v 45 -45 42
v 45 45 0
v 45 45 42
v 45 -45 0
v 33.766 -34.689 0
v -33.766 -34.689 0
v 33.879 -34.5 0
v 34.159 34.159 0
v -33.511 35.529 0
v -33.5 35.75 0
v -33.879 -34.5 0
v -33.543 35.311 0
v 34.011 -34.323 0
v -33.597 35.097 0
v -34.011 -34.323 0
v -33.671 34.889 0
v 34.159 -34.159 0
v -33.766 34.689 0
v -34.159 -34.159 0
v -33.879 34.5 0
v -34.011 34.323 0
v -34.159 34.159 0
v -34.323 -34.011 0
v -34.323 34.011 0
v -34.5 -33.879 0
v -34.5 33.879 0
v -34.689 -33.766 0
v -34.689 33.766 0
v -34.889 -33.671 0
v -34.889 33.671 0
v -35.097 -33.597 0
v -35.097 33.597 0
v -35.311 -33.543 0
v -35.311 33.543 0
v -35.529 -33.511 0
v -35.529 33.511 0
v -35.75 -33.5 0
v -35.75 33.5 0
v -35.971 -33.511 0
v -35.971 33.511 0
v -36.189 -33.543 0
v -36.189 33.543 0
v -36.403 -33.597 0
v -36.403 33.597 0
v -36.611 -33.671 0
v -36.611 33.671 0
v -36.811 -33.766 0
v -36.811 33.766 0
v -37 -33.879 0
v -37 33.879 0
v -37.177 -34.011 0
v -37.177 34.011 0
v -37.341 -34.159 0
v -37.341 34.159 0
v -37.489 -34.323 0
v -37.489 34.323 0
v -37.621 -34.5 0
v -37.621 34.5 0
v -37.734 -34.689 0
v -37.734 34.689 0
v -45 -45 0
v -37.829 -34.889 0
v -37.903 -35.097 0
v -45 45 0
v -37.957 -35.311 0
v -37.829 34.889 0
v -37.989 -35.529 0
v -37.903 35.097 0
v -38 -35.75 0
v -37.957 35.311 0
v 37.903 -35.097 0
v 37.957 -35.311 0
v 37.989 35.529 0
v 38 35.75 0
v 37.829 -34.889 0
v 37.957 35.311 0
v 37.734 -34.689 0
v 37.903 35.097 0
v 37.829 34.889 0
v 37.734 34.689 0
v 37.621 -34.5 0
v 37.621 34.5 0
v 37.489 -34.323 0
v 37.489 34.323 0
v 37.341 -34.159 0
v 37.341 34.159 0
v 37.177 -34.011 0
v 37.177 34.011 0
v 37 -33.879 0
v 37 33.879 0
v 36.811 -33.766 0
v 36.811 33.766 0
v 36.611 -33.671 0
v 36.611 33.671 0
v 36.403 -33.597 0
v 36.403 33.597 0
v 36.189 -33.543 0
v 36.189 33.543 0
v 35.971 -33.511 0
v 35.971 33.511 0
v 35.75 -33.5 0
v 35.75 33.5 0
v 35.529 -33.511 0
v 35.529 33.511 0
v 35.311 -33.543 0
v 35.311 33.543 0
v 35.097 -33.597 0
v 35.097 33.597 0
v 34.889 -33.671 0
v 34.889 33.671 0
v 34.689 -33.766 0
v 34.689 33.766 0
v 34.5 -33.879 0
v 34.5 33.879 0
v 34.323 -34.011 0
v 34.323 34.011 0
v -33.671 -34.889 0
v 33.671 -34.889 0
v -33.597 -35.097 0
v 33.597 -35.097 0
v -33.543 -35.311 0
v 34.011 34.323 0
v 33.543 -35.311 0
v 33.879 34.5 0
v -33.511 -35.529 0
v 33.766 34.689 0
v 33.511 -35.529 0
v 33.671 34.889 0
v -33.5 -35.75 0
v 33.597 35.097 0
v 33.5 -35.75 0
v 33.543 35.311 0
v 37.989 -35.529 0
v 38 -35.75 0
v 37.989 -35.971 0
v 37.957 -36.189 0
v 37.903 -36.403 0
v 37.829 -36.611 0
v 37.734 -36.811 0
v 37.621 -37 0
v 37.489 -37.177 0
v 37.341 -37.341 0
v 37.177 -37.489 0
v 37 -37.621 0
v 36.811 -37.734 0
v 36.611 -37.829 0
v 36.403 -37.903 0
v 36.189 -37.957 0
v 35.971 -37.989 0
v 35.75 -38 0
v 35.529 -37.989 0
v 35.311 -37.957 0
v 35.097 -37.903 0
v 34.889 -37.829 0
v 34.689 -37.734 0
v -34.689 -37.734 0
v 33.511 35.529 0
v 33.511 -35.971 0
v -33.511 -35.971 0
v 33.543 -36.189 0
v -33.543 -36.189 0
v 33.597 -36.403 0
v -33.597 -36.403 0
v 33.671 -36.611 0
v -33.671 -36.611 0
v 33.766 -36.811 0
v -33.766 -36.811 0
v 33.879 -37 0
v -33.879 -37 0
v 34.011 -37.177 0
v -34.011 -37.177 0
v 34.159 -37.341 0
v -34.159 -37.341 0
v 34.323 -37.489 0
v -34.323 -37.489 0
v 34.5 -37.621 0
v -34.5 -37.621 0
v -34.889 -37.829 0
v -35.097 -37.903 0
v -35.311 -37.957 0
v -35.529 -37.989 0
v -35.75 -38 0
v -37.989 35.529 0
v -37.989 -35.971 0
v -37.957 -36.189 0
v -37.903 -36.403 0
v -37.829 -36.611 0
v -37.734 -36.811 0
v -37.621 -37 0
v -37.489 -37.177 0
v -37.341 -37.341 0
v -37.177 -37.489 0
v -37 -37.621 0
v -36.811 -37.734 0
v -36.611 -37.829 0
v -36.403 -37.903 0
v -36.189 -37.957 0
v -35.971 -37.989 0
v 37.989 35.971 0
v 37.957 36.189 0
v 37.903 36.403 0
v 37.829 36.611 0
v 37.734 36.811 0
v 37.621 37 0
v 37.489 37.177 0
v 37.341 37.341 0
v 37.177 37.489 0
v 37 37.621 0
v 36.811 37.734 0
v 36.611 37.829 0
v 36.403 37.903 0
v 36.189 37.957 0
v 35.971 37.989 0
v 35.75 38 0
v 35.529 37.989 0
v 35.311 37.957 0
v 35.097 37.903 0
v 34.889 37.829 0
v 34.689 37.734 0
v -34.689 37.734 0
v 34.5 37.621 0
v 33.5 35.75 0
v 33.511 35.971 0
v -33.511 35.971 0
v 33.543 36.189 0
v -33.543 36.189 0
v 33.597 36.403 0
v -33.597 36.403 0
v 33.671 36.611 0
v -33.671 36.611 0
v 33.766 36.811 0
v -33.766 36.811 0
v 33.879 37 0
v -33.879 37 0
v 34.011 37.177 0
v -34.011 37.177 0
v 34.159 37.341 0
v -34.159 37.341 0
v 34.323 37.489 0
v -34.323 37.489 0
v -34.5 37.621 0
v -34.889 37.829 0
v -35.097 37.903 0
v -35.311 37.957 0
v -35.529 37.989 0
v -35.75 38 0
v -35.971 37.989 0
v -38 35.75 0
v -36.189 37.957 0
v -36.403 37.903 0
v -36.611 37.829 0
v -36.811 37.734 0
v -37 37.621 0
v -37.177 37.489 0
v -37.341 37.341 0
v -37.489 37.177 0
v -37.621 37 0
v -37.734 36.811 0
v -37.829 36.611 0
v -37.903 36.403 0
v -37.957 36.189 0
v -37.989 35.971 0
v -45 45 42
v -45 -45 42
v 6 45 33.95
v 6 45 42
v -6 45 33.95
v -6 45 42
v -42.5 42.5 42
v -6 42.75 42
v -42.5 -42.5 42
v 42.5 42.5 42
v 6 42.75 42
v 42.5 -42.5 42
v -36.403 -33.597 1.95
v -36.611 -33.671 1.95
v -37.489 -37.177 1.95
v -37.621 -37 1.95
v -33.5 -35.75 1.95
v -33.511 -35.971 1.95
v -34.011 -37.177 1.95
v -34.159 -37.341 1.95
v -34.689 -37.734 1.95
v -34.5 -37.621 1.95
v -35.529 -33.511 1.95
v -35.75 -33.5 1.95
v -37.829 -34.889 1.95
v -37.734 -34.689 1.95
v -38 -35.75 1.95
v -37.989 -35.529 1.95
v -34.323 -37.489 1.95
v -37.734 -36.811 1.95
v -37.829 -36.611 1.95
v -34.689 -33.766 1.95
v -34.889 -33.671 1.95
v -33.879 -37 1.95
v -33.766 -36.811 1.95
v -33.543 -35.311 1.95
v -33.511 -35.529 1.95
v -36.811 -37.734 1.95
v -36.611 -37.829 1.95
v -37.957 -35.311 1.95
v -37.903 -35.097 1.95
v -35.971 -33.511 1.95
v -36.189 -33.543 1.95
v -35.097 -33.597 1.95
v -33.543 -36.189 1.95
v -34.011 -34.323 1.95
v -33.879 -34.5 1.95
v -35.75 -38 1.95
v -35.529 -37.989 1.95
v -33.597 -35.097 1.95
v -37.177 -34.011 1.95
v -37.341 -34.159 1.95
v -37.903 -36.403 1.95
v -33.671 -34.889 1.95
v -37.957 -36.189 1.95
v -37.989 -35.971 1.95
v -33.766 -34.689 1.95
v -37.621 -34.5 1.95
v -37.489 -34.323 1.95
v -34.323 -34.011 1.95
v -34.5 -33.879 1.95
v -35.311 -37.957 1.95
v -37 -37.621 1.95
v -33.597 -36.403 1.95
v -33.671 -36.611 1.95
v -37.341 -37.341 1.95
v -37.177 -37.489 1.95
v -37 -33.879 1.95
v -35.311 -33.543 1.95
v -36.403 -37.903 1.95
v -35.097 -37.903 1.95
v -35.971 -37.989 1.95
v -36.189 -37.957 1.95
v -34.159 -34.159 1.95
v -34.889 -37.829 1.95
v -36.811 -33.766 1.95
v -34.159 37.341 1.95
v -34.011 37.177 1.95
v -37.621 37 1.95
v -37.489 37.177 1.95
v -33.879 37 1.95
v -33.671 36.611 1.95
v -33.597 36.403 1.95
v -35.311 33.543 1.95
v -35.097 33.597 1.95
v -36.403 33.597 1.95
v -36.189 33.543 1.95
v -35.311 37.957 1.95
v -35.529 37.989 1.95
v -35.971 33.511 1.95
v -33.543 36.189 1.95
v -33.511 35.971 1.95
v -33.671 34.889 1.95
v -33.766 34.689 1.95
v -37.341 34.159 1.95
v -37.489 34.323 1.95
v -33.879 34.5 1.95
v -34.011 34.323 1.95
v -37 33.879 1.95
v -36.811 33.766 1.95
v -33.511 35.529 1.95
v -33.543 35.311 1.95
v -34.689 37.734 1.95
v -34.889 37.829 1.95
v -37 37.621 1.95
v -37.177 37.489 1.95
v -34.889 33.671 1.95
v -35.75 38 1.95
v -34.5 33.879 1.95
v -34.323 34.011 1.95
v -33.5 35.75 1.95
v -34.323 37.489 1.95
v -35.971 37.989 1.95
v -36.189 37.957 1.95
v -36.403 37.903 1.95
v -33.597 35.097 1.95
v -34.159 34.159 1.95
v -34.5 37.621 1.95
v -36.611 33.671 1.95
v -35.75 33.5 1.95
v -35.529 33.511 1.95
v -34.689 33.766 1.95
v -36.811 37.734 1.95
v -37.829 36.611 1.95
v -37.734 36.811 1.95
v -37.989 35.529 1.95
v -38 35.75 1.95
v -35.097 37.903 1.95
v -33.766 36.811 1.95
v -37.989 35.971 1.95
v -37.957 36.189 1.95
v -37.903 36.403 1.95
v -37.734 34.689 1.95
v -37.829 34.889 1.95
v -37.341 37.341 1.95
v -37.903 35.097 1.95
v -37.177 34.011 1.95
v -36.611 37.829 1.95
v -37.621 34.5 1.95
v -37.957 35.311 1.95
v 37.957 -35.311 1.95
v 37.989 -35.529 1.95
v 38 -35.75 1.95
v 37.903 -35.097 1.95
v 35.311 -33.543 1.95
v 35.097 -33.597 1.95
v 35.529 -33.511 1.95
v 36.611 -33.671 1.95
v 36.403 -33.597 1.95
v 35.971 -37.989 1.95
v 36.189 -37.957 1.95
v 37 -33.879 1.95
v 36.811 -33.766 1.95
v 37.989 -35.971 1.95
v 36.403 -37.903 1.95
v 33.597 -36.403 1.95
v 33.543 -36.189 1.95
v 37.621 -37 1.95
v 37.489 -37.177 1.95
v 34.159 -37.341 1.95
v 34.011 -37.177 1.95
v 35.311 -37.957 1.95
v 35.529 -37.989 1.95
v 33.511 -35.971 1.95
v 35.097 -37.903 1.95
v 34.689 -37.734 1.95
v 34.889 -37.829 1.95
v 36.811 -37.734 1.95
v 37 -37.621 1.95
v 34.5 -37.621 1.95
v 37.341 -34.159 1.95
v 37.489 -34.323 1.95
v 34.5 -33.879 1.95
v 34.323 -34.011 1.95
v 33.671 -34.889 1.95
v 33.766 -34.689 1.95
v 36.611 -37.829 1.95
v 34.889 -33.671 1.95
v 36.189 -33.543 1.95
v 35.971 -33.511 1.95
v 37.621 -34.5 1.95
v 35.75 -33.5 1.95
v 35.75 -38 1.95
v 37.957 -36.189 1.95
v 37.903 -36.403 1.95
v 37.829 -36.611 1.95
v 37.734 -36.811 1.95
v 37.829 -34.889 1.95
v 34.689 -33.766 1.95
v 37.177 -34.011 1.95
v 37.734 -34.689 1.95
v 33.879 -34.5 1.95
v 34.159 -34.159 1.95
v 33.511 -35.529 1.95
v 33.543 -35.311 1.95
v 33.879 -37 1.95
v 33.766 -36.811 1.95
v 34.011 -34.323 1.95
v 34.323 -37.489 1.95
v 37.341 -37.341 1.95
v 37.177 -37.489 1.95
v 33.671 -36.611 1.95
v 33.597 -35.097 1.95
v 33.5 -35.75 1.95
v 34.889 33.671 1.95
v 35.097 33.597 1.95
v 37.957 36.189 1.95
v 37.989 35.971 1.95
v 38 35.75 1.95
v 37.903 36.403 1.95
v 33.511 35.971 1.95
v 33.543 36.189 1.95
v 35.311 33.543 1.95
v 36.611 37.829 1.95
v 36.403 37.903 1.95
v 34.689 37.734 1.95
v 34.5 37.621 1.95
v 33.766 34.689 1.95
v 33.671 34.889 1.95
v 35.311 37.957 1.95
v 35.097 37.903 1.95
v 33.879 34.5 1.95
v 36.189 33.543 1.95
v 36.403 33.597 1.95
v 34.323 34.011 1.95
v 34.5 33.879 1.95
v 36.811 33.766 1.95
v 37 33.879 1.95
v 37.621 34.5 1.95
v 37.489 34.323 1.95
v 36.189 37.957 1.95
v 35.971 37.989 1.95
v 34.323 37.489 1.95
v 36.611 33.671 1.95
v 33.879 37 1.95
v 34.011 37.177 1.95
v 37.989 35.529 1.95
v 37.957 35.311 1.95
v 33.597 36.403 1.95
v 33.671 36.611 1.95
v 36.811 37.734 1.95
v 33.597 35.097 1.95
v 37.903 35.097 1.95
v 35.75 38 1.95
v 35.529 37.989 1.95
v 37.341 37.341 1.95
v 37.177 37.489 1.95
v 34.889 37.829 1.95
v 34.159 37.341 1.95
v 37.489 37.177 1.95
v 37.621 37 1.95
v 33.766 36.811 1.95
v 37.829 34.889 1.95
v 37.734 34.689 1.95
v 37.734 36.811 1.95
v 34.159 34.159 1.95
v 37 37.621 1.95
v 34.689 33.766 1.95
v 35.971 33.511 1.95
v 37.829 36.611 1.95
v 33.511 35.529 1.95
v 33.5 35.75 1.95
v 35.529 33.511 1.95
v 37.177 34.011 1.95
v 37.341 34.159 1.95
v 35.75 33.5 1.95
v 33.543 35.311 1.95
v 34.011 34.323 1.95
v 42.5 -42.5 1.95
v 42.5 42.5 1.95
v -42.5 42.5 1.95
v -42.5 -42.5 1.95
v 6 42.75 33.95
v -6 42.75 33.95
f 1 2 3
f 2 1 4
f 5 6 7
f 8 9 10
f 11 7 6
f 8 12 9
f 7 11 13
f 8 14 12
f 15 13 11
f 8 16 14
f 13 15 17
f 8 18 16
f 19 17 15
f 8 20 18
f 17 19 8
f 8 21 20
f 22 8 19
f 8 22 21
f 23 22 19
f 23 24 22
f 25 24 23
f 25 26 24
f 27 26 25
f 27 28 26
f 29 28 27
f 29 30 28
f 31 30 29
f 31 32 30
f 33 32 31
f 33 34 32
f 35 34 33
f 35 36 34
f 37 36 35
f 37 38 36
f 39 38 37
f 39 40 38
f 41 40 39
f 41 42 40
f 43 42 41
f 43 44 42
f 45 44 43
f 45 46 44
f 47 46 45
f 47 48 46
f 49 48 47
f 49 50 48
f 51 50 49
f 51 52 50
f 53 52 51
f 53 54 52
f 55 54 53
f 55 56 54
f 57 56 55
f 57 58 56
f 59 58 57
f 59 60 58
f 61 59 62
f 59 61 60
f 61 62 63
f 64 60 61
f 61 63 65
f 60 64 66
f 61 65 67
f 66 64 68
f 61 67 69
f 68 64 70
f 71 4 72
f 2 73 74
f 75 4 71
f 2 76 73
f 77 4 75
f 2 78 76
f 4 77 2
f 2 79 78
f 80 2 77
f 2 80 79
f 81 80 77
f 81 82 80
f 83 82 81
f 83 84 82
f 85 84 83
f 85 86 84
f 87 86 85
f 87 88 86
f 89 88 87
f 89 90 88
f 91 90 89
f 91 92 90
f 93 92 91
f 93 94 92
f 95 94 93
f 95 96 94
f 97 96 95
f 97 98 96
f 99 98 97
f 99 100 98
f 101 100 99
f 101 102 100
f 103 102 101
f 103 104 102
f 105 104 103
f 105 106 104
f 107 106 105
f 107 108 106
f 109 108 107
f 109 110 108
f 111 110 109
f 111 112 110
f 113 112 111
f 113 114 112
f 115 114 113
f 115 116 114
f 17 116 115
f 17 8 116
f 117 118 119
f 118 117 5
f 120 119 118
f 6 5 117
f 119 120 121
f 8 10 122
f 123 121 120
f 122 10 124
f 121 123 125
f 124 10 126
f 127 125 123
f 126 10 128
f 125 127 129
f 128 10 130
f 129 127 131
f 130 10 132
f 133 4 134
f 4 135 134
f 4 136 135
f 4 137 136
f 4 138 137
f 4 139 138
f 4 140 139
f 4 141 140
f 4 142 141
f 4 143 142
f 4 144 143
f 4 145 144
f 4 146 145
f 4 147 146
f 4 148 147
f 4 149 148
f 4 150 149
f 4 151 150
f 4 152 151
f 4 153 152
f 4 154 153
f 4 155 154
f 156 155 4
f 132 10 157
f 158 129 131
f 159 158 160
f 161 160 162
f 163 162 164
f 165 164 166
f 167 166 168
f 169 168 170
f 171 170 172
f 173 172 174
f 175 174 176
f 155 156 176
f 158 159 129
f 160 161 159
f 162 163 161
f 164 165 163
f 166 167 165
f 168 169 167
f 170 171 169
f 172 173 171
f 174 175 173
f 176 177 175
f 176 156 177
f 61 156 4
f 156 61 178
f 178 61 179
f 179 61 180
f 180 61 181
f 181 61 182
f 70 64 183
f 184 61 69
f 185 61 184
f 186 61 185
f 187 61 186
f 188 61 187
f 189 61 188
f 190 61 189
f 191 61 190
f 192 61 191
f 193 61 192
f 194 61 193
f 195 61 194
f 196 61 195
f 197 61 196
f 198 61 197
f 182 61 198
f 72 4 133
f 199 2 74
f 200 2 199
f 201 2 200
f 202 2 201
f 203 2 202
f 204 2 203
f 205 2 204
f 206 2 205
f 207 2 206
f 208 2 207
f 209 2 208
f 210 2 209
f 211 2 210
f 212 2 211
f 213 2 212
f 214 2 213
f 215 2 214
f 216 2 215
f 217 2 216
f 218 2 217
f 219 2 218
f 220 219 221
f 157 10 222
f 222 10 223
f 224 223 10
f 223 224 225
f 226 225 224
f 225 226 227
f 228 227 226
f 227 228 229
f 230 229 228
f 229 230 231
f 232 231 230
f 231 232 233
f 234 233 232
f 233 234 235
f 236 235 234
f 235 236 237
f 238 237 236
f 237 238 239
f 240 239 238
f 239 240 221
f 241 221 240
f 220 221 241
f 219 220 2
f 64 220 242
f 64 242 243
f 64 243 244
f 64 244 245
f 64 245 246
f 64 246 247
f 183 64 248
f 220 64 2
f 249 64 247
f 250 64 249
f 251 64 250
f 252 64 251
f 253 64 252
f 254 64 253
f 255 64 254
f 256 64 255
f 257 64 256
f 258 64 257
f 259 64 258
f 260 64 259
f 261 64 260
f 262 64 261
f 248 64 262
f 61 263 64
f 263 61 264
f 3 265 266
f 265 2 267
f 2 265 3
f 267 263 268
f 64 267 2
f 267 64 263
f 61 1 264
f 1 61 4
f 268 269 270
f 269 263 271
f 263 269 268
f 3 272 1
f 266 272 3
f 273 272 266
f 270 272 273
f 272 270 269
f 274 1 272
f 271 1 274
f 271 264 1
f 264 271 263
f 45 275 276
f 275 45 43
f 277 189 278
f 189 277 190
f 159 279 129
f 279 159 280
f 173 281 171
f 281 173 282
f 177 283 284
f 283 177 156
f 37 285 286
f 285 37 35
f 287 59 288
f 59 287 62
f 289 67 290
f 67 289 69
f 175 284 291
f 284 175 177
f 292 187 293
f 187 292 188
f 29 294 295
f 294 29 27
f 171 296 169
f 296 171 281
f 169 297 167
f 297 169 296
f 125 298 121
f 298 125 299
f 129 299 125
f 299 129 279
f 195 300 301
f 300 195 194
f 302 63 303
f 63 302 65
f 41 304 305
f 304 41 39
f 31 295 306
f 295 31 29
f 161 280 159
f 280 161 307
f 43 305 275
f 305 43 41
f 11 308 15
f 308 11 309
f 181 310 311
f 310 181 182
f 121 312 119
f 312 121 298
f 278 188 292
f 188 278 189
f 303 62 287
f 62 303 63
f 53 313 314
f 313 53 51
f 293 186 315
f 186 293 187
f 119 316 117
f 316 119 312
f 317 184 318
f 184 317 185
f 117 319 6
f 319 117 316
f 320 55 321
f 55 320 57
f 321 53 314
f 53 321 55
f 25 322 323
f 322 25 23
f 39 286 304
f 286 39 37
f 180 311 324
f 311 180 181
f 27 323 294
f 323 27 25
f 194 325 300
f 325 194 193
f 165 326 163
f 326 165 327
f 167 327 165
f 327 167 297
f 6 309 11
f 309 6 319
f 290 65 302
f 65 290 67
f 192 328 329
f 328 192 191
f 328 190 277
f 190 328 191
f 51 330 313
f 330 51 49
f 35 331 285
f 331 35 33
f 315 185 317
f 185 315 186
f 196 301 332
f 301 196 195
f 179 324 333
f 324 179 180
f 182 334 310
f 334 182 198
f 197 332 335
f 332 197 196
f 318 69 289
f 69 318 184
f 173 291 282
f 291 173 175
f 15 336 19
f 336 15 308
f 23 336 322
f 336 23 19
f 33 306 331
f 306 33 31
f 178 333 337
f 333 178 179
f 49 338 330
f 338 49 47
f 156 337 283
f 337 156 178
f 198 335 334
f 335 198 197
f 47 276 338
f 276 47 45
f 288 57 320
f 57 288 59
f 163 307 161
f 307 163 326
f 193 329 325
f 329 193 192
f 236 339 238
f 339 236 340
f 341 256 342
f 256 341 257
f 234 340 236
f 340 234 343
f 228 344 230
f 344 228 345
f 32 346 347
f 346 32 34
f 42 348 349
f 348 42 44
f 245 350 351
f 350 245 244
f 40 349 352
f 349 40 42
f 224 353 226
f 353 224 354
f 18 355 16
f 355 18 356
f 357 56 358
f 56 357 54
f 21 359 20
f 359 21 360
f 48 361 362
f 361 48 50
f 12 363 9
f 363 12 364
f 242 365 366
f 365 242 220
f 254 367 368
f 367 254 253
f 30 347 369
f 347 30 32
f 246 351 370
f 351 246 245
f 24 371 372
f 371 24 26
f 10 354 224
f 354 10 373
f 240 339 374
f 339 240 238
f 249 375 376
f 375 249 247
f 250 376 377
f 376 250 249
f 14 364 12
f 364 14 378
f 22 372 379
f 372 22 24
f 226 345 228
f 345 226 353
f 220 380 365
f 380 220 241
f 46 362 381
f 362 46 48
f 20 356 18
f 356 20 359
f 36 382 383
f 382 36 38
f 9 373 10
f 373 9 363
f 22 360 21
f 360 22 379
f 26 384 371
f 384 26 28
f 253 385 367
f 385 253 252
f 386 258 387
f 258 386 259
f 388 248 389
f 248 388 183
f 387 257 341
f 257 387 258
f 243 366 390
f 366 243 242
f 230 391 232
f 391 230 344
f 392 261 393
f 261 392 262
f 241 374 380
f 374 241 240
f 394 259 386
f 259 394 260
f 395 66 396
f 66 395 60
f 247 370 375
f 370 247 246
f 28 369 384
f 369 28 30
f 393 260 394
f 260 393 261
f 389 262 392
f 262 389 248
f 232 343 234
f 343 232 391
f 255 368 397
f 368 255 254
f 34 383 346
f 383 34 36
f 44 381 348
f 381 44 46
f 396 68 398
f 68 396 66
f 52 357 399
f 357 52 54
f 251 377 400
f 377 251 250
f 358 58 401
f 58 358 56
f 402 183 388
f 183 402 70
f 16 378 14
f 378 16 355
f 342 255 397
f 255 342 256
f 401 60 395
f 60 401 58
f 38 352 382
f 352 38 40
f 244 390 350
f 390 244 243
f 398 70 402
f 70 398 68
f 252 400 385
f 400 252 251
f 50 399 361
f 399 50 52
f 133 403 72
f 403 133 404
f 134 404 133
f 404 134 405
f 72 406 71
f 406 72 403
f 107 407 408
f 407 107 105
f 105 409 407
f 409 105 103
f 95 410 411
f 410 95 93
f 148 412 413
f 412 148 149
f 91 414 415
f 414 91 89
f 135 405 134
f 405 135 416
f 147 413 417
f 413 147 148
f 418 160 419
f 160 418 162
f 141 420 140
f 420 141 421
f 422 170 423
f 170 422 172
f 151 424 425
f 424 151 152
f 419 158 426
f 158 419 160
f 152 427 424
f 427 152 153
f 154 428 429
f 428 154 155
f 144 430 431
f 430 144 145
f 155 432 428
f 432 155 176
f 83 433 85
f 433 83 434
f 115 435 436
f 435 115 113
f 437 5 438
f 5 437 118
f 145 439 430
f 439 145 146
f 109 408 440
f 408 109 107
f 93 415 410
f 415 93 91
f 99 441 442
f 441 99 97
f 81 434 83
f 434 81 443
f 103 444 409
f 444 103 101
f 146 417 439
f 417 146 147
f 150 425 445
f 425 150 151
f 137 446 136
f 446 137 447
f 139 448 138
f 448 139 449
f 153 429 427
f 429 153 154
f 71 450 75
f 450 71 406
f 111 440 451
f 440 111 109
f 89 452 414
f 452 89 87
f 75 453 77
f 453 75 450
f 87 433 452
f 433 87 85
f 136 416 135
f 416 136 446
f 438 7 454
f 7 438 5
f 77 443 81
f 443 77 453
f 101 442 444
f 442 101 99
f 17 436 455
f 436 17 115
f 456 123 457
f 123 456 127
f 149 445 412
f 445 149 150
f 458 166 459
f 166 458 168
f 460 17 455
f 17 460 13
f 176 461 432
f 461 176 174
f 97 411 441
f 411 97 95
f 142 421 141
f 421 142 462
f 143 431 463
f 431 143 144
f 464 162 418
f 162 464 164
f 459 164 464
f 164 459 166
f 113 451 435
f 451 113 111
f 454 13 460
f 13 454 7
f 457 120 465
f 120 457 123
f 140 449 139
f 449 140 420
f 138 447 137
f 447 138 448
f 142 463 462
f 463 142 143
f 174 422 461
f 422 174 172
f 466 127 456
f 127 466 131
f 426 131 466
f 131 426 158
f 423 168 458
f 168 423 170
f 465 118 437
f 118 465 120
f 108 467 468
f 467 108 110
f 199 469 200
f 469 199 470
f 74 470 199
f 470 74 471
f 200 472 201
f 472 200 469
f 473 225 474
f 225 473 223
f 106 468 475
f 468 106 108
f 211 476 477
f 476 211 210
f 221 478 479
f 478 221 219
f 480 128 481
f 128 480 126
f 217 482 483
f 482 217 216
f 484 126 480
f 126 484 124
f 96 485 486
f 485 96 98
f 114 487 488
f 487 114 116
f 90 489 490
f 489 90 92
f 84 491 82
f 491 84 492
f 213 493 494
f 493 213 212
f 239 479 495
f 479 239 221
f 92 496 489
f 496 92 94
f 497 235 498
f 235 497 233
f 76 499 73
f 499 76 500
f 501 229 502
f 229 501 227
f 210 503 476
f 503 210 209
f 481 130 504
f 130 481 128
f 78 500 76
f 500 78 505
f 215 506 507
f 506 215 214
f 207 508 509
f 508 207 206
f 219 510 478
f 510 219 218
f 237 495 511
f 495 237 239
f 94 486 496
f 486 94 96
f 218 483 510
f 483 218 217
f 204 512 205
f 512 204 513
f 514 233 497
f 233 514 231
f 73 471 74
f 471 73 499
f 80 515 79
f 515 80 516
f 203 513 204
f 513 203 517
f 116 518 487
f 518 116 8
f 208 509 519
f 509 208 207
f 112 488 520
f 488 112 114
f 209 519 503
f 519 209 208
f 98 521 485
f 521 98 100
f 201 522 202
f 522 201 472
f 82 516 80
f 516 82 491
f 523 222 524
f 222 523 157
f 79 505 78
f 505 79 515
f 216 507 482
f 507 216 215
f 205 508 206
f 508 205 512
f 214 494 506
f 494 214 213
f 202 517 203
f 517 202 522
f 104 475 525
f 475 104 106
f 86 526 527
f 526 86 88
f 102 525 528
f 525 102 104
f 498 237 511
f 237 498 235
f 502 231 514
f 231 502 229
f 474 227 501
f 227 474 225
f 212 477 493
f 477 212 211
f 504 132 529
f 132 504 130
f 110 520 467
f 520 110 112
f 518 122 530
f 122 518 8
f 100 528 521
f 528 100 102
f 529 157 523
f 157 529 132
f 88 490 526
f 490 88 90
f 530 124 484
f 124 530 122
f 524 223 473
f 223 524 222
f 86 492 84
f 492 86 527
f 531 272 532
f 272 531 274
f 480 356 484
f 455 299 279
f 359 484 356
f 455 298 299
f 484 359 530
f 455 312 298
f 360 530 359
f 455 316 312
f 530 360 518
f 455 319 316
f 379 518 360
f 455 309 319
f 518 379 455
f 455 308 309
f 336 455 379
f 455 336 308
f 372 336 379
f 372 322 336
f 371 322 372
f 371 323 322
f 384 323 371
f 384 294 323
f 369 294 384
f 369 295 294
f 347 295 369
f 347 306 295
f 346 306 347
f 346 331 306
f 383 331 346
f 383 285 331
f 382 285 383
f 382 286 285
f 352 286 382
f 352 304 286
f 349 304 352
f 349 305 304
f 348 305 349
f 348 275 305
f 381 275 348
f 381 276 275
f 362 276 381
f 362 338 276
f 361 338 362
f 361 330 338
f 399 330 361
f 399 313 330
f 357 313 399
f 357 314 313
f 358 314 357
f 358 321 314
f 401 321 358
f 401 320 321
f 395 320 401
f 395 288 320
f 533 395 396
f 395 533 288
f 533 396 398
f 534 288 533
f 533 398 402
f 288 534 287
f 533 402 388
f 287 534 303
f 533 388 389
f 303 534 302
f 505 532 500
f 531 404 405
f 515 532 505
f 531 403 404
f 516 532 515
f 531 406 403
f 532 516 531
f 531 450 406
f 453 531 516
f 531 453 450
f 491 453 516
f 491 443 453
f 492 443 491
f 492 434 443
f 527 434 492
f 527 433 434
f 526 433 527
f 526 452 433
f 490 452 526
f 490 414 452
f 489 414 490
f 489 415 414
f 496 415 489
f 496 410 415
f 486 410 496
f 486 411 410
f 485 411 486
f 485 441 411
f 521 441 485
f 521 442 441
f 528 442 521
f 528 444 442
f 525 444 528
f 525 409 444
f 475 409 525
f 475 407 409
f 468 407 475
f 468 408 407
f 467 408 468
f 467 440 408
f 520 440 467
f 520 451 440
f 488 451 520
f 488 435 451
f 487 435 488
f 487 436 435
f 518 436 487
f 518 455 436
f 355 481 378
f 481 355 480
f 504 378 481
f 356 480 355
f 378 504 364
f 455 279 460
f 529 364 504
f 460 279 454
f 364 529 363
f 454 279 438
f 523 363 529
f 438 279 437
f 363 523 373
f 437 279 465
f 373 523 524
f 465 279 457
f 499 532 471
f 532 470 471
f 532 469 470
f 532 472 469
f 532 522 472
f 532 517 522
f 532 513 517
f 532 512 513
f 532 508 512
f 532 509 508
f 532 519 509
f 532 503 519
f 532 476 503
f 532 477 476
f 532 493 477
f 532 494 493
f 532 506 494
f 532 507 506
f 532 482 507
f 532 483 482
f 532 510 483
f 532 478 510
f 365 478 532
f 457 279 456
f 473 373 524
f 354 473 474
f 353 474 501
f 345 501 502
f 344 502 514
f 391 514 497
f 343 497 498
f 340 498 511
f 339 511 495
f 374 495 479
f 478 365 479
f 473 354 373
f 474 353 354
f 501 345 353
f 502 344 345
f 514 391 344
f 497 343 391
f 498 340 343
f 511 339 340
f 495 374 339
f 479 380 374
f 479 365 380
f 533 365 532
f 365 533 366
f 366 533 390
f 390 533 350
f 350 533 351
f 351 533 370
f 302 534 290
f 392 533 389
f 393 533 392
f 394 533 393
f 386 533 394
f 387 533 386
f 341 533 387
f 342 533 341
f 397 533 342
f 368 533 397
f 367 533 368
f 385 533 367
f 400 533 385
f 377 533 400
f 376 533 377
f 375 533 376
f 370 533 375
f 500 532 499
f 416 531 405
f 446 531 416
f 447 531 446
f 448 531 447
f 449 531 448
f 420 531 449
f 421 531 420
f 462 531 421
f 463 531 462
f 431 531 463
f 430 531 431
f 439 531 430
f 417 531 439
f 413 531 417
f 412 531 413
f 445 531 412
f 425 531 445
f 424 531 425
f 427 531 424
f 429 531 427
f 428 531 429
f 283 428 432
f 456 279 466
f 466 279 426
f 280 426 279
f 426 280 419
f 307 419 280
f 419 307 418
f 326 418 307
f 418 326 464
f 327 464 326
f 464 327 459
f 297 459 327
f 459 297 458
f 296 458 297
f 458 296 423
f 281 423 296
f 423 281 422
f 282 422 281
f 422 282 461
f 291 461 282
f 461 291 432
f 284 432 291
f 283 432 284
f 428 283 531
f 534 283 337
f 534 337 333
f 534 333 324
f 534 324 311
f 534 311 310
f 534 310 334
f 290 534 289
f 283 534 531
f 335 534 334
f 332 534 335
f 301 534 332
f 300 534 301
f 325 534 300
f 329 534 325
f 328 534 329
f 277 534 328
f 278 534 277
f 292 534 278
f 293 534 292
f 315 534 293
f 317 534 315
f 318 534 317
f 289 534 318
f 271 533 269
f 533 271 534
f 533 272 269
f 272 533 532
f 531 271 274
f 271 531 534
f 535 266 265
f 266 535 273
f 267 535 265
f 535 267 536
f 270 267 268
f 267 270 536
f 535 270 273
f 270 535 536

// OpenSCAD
// --- Dimensions (mm) ---
outer_width = 90;          // Outer dimension of the square box (X)
outer_length = 90;         // Outer dimension of the square box (Y)
wall_thickness = 2.5;      // Thickness of the four vertical walls
top_plate_thickness = 2;   // Thickness of the top plate (the stirring surface)
total_wall_height = 40;    // Height of the walls rising from the plate
screw_hole_diameter = 4.5; // Diameter for M4 screw holes
screw_pattern_size = 71.5; // Distance between screw hole centers
notch_width = 12;          // Width of the cable notch
notch_depth = 8;           // Depth of the notch from the open edge
$fn = 64;                  // Smoothness for circular features

// --- Implementation ---
// The part is printed upside down.
// The top plate (stirring surface) lies on the bed (z = 0 to 2).
// The walls rise from the plate to z = 42 (2 + 40).

difference() {
    // 1. The Main Body (Plate + Walls)
    union() {
        // The Top Plate (Base of the box in print orientation)
        // Positioned at Z = 0 to Z = 2
        translate([0, 0, top_plate_thickness / 2])
            cube([outer_width, outer_length, top_plate_thickness], center = true);
        
        // The Four Walls
        // They start at the top of the plate (Z = 2) and rise 40mm (to Z = 42)
        // The center of the wall block is at Z = 2 + (40/2) = 22
        translate([0, 0, top_plate_thickness + (total_wall_height / 2)])
            cube([outer_width, outer_length, total_wall_height], center = true);
    }

    // 2. Subtracting the Interior (Hollowing out the box)
    // The interior starts from the top of the plate (Z=2) up to the top (Z=42)
    // We use a slightly taller cube to ensure a clean cut through the top edge.
    translate([0, 0, top_plate_thickness + (total_wall_height / 2)])
        cube([outer_width - 2 * wall_thickness, outer_length - 2 * wall_thickness, total_wall_height + 0.1], center = true);

    // 3. Screw Holes (M4)
    // Drilled through the top plate (Z = 0 to 2)
    for (x = [-1, 1], y = [-1, 1]) {
        translate([x * screw_pattern_size / 2, y * screw_pattern_size / 2, -1])
            cylinder(d = screw_hole_diameter, h = top_plate_thickness + 2);
    }

    // 4. Cable Notch
    // Located in one wall, centered along the wall.
    // Reaches 8mm down from the open edge (z = 42 down to z = 34).
    // The notch is 12mm wide (X).
    // We place it on the wall at Y = outer_length/2.
    // The notch spans Z from (42 - 8) to 42.
    // The notch is 12mm wide (X), 8mm deep (Y), and 8mm high (Z).
    // To cut through the wall at Y=45, we translate the notch to the edge.
    // The notch is centered on the wall in X and Z.
    // Z center = (42 + 34) / 2 = 38.
    // We use a cube that is wider than the wall to ensure a clean cut through the wall.
    // We translate it so it's centered on the wall.
    translate([0, outer_length / 2, top_plate_thickness + total_wall_height - (notch_depth / 2)])
        cube([notch_width, wall_thickness + 2, notch_depth + 0.1], center = true);
}

// Verification of requirements:
// - Printed upside down: Top plate at Z=0 to 2. (Correct)
// - Outer size 90x90. (Correct)
// - Wall thickness 2.5. (Correct)
// - Top plate thickness 2. (Correct)
// - Walls rise to Z=42 (2+40). (Correct)
// - 4x 4.5mm holes on 71.5mm pattern. (Correct)
// - Notch: 12mm wide, 8mm down from open edge. (Correct)
